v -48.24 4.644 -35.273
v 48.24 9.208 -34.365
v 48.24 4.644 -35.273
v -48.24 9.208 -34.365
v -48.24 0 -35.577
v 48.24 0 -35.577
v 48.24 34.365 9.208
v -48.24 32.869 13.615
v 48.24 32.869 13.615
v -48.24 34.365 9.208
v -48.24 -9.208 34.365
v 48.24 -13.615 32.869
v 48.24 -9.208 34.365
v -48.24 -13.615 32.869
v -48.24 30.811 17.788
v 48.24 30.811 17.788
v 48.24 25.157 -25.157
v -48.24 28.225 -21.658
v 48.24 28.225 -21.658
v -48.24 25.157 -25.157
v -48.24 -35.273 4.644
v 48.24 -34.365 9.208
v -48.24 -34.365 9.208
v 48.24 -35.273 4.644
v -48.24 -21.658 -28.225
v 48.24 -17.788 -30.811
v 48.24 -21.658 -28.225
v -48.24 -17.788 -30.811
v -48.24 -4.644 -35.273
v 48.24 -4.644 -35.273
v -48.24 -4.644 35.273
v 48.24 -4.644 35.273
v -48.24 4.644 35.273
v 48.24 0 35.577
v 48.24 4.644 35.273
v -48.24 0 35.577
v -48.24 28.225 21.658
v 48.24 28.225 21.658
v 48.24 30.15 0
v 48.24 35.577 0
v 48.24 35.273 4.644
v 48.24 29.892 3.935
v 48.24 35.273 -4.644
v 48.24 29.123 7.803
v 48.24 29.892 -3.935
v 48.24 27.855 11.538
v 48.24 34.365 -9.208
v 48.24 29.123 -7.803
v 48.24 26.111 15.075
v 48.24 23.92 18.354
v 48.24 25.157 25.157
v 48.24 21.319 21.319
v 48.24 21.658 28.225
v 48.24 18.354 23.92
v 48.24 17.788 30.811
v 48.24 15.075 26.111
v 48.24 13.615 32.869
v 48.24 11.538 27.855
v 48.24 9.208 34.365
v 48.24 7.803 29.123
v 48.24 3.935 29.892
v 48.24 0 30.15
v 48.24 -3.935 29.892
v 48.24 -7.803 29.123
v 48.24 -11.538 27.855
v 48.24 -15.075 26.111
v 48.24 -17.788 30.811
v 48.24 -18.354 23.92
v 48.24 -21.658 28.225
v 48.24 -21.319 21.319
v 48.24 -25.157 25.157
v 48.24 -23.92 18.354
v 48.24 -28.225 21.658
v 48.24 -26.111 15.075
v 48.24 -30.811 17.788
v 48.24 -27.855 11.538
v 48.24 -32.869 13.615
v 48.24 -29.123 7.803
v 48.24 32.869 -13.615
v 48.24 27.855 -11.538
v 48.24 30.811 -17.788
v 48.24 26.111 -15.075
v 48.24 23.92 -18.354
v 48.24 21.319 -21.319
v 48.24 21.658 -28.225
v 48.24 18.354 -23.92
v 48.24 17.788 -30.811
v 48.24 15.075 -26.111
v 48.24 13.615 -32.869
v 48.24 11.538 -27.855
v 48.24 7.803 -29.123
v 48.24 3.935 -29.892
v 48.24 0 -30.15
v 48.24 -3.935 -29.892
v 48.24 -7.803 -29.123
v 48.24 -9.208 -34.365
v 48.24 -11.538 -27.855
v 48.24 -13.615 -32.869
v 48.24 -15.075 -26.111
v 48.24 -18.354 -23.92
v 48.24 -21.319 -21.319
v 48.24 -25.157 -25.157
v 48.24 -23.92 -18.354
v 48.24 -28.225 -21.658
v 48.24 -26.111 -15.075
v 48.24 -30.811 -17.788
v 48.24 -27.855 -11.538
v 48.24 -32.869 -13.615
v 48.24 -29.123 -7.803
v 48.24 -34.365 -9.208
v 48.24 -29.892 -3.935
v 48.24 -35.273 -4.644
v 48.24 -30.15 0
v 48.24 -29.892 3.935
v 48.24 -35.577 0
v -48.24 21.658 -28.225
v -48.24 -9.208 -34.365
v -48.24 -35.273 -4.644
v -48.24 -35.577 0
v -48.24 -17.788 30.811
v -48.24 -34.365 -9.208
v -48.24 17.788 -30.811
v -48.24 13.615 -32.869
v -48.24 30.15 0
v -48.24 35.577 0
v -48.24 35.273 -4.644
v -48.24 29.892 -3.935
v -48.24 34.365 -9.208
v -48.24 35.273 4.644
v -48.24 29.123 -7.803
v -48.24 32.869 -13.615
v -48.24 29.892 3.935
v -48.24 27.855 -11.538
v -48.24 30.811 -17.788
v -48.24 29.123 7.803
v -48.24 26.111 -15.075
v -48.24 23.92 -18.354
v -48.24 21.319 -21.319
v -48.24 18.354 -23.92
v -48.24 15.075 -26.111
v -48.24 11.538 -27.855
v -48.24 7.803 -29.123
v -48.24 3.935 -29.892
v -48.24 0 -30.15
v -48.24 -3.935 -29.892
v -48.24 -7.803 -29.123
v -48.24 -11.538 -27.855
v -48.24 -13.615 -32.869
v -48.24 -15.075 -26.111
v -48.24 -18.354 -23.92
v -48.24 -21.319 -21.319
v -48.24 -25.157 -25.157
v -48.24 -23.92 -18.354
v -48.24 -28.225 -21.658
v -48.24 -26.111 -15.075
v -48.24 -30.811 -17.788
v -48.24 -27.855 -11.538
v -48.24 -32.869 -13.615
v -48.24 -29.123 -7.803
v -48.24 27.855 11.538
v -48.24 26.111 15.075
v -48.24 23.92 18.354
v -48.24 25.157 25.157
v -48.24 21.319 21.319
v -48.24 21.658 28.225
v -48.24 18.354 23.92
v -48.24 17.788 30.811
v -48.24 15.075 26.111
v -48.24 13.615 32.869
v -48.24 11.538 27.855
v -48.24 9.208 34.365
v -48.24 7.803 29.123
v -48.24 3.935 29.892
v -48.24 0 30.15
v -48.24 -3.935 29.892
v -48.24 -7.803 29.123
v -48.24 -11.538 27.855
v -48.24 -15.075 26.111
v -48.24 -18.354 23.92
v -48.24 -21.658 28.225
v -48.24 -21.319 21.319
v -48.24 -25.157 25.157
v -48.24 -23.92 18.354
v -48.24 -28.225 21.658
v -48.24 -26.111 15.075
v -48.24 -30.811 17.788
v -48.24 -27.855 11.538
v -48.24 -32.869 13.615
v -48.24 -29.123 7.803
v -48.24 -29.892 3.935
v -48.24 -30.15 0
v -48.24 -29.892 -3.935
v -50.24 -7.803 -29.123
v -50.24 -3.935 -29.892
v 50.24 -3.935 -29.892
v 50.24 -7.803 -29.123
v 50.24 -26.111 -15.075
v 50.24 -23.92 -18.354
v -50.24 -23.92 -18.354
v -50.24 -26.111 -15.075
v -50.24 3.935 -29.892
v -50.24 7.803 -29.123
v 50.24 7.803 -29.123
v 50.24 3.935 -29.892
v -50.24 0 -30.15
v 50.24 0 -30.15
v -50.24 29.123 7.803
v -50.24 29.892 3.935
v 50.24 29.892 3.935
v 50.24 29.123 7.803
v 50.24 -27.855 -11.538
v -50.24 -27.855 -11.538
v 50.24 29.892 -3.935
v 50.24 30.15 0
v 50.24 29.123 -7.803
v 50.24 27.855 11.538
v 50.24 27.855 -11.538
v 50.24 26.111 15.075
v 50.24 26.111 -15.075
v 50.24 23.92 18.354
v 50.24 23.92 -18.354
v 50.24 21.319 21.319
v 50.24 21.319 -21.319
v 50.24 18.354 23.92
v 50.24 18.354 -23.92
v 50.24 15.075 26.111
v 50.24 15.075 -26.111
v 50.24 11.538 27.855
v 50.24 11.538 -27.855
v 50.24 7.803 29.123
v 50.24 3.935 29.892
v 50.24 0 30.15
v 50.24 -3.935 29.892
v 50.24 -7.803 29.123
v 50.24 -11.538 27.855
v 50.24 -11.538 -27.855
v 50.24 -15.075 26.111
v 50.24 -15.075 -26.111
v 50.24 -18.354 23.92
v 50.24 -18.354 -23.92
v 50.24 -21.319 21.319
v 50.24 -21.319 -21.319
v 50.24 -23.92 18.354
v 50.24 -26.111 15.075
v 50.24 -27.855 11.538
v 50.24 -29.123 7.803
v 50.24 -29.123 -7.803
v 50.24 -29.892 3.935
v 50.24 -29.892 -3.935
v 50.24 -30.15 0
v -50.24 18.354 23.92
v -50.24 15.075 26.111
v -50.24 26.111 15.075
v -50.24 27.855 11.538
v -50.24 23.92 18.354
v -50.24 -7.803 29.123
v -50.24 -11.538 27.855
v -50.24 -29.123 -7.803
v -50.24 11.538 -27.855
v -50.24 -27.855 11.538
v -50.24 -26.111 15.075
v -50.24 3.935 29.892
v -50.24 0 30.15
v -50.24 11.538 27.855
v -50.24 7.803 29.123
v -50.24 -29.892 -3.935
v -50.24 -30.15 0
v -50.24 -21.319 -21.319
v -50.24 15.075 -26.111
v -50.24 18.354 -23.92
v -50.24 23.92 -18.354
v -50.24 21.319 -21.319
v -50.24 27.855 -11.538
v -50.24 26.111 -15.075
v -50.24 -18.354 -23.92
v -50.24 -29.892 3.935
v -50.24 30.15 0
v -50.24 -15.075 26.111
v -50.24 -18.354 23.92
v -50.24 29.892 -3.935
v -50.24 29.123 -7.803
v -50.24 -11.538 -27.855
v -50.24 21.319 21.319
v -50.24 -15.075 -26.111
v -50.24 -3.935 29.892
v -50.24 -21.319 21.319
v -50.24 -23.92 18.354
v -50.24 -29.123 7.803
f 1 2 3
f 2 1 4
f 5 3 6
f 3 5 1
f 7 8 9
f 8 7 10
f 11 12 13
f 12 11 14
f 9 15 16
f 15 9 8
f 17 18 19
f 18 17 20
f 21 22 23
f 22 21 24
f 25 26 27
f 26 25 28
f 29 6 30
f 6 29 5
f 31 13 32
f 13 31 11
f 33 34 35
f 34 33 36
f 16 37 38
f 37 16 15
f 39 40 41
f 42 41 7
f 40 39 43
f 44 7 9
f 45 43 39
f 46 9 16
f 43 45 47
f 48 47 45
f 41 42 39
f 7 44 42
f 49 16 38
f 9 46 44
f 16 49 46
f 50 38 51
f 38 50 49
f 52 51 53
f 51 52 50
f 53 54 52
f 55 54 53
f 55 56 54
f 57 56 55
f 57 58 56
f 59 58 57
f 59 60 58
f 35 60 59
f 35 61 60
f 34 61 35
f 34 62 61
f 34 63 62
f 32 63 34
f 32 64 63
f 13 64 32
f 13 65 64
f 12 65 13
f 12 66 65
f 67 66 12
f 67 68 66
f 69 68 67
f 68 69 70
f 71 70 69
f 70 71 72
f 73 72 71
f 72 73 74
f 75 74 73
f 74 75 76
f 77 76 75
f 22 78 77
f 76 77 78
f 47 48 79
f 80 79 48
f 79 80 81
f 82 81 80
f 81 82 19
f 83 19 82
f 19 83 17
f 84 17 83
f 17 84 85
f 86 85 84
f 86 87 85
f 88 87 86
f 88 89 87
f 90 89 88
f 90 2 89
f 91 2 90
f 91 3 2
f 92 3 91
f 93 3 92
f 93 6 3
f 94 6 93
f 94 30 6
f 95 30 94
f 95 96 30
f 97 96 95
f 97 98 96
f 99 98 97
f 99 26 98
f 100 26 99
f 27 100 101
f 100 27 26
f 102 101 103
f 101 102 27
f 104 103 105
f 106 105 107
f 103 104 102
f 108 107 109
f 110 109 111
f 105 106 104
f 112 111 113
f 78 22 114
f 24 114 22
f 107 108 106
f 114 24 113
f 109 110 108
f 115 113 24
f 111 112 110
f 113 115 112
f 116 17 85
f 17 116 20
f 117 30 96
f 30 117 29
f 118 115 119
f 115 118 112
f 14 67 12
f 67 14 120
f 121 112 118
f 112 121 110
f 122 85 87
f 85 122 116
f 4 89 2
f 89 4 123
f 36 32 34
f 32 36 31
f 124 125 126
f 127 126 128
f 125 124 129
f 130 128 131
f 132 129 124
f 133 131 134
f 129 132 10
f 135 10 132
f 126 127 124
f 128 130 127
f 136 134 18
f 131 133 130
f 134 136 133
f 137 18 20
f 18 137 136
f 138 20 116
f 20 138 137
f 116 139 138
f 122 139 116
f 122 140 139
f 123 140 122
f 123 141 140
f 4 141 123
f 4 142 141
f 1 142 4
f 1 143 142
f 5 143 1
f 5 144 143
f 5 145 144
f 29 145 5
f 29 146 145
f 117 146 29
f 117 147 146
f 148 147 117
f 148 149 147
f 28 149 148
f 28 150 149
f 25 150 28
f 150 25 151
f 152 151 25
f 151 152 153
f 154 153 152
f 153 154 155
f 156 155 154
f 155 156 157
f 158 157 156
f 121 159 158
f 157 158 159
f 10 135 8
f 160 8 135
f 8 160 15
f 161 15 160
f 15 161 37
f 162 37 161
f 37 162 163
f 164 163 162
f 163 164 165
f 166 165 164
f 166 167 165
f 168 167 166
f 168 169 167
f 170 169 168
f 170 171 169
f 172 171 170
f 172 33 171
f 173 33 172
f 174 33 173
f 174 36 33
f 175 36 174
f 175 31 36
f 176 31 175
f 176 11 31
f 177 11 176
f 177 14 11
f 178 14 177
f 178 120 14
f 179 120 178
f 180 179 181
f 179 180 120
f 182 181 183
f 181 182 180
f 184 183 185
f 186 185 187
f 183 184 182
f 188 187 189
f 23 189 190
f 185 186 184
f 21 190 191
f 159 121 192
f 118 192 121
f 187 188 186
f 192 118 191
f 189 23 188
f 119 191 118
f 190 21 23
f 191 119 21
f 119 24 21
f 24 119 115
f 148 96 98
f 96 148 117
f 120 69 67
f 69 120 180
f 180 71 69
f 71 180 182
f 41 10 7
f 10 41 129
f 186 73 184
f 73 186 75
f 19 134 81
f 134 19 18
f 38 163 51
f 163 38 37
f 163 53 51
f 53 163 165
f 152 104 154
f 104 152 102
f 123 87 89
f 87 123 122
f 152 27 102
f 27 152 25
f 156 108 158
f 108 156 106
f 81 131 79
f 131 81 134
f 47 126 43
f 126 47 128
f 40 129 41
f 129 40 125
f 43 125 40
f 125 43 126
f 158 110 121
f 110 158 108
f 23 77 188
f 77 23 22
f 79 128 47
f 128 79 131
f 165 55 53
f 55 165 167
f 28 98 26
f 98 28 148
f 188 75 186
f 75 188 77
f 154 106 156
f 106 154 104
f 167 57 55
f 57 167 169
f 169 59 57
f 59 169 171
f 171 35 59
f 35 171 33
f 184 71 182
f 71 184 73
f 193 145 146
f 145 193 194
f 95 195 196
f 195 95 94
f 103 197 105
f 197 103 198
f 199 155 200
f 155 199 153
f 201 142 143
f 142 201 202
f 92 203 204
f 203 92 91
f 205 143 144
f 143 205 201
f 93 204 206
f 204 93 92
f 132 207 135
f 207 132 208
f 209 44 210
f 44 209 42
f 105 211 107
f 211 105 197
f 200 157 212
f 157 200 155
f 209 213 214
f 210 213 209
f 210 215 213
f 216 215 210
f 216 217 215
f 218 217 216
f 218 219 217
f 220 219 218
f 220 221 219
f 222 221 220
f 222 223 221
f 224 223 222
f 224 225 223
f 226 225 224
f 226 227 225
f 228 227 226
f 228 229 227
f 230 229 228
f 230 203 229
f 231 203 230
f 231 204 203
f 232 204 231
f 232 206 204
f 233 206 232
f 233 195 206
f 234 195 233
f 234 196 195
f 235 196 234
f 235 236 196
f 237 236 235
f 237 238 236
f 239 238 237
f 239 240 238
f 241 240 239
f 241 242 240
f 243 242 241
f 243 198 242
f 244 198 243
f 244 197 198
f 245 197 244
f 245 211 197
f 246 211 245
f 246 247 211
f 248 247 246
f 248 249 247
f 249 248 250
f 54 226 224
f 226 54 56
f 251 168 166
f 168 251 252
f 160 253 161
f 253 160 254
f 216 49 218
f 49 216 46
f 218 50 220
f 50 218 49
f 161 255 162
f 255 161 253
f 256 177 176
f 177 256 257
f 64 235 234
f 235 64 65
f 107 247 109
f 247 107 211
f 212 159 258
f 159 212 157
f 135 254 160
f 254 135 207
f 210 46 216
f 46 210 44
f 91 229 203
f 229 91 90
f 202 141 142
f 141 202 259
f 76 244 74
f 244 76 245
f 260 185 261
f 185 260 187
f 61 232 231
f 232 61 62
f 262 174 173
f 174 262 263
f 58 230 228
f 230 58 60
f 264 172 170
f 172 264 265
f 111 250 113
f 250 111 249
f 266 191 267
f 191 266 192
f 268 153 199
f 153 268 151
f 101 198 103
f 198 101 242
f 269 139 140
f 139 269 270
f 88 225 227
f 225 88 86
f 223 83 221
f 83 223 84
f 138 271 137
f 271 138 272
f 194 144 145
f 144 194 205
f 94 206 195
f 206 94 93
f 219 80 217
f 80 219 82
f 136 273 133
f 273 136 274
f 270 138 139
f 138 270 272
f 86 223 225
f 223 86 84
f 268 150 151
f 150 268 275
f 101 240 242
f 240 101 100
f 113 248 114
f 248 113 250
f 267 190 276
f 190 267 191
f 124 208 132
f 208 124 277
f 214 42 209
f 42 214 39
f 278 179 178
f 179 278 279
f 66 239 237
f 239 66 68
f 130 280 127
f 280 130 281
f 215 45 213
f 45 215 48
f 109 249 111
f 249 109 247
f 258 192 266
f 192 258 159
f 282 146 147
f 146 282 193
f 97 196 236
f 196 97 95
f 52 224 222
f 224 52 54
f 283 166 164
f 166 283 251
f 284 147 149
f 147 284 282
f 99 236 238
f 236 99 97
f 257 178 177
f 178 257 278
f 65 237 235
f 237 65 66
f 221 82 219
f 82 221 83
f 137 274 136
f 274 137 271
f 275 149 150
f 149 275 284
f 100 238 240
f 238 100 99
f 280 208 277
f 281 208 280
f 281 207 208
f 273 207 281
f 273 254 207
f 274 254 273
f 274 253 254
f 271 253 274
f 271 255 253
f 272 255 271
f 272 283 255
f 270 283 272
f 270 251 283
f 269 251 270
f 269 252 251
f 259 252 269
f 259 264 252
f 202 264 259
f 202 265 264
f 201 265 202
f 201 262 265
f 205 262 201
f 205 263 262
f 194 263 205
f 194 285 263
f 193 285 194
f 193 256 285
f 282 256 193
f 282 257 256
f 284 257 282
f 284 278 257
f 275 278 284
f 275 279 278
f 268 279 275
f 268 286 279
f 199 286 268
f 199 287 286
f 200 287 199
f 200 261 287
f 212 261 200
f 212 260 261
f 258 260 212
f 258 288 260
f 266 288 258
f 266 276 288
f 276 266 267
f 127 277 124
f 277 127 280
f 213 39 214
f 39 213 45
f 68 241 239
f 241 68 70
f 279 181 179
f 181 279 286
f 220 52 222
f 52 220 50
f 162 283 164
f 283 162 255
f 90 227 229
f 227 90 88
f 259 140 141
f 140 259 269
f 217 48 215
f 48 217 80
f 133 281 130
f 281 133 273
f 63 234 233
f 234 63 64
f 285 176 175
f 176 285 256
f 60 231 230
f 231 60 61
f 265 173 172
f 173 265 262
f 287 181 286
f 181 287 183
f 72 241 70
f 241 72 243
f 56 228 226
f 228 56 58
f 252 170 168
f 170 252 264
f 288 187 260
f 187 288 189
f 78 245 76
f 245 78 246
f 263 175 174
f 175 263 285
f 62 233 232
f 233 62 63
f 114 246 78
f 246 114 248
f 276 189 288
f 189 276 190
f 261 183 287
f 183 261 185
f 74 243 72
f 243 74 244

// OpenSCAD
// Auto-generated by scripts/author_from_manifest.py (Phase D.3).
// Source: data/phase_d_manifest.json (sku_intent='victaulic-107v-quickvic-coupling-2in').
// Do not hand-edit — regenerate from the manifest.
//
// @part victaulic_107v_quickvic_coupling_2in
// @kind fitting
// @category fitting.coupling
// @display-name "Victaulic QuickVic Style 107V Installation-Ready Coupling 2\""
// @mfg victaulic
// @mfg-pn Style_107V_2in
// @listing UL FM
// @price-usd 52.00
// @install-minutes 6
// @crew journeyman
// @param size_in number default=2 label="Size" unit="in"
// @port inlet position=[-0.05,0,0] direction=[-1,0,0] style=grooved size_in=2 role=run_a
// @port outlet position=[0.05,0,0] direction=[1,0,0] style=grooved size_in=2 role=run_b

size_in = 2.0;

function od_mm(nps) =
    nps ==   1  ? 33.4 :
    nps == 1.25 ? 42.2 :
    nps == 1.5  ? 48.3 :
    nps ==   2  ? 60.3 :
    nps == 2.5  ? 73.0 :
    nps ==   3  ? 88.9 :
    nps ==   4  ? 114.3 :
    nps ==   5  ? 141.3 :
    nps ==   6  ? 168.3 :
    nps ==   8  ? 219.1 :
    nps ==  10  ? 273.0 : 60.3;

od = od_mm(size_in);
len_mm = od * 1.6;

rotate([0, 90, 0])
    union() {
        cylinder(h = len_mm, d = od * 1.18, center = true, $fn = 48);
        cylinder(h = len_mm + 4, d = od, center = true, $fn = 48);
    }
